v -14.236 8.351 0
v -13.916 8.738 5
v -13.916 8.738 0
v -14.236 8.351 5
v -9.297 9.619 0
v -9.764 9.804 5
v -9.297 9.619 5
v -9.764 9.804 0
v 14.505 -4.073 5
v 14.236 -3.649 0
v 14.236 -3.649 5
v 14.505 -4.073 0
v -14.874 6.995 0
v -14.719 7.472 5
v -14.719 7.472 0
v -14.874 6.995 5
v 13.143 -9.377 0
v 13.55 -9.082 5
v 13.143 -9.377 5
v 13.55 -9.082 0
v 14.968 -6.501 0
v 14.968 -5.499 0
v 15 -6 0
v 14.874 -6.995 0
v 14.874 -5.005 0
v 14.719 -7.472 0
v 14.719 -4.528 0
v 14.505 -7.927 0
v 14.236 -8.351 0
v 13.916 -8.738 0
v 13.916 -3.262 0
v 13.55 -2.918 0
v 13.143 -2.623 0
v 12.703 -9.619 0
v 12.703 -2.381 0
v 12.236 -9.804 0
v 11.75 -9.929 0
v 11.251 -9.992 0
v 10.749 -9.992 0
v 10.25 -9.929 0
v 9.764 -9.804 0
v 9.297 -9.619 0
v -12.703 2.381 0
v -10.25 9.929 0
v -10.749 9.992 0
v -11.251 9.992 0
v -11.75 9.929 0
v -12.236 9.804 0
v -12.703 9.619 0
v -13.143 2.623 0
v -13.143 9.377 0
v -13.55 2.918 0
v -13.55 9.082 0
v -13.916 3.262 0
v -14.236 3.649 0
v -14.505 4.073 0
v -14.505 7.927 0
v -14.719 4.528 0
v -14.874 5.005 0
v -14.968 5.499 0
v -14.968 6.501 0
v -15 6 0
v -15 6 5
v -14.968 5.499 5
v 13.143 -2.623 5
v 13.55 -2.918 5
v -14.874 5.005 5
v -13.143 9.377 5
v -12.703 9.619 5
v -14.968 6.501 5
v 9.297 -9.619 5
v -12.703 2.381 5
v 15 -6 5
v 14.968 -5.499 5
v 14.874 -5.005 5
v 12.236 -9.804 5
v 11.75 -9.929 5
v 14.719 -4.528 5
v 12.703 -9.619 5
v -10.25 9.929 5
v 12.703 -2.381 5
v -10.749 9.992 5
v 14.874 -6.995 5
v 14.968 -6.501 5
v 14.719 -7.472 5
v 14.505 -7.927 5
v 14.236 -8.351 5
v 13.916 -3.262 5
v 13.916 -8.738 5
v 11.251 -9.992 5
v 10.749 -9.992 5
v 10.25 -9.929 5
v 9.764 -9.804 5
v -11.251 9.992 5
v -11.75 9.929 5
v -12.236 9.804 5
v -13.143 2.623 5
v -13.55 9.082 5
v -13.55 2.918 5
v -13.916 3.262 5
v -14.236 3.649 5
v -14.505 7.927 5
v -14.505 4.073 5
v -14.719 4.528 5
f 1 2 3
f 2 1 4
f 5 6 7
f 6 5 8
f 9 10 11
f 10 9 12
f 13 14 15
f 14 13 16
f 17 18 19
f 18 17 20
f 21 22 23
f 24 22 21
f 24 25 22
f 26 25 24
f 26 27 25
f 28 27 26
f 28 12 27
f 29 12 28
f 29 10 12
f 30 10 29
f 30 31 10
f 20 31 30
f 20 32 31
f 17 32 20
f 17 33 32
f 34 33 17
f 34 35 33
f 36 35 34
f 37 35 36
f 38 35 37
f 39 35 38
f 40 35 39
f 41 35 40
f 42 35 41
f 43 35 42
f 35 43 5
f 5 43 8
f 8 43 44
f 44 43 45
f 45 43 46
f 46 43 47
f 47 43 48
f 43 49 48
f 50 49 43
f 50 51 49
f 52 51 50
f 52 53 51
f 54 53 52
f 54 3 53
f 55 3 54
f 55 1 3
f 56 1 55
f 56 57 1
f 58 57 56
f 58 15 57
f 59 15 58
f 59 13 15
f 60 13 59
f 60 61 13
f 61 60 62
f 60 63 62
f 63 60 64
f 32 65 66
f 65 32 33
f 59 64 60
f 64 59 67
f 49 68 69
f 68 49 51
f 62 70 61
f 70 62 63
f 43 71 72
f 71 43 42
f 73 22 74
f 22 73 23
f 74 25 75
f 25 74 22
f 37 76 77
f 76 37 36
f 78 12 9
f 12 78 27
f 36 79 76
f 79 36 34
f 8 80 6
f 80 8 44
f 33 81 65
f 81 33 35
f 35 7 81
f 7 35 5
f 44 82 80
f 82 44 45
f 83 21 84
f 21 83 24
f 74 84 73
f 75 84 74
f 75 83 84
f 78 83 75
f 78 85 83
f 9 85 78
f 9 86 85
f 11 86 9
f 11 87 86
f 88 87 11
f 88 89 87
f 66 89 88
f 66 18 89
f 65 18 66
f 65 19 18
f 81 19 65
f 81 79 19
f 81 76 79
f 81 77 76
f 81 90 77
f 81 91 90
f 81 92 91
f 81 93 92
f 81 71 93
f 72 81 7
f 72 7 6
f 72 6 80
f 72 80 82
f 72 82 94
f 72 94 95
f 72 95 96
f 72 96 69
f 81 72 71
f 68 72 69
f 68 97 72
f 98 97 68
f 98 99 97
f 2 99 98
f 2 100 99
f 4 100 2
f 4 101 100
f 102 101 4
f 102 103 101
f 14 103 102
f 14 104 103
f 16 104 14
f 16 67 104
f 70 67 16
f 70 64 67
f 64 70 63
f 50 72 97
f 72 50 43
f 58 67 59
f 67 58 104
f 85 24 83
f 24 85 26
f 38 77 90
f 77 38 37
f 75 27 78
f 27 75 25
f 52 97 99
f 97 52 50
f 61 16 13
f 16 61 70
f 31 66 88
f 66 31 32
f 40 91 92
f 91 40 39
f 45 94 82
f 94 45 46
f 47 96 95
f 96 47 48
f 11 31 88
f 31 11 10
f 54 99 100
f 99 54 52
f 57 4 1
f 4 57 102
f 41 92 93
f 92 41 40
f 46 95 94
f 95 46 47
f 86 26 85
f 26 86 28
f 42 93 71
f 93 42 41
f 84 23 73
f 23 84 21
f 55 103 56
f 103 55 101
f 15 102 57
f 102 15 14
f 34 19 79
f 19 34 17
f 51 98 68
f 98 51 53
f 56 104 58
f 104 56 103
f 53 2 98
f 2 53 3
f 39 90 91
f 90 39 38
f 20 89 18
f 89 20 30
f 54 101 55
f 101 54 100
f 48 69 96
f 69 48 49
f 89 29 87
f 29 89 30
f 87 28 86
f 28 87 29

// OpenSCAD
$fn = 50;

difference() {
	union() {
		hull() {
			translate(v = [-11.0, 6.0, 0]) {
				cylinder(h = 5, r = 4);
			}
			translate(v = [11.0, -6.0, 0]) {
				cylinder(h = 5, r = 4);
			}
		}
	}
	union();
}
